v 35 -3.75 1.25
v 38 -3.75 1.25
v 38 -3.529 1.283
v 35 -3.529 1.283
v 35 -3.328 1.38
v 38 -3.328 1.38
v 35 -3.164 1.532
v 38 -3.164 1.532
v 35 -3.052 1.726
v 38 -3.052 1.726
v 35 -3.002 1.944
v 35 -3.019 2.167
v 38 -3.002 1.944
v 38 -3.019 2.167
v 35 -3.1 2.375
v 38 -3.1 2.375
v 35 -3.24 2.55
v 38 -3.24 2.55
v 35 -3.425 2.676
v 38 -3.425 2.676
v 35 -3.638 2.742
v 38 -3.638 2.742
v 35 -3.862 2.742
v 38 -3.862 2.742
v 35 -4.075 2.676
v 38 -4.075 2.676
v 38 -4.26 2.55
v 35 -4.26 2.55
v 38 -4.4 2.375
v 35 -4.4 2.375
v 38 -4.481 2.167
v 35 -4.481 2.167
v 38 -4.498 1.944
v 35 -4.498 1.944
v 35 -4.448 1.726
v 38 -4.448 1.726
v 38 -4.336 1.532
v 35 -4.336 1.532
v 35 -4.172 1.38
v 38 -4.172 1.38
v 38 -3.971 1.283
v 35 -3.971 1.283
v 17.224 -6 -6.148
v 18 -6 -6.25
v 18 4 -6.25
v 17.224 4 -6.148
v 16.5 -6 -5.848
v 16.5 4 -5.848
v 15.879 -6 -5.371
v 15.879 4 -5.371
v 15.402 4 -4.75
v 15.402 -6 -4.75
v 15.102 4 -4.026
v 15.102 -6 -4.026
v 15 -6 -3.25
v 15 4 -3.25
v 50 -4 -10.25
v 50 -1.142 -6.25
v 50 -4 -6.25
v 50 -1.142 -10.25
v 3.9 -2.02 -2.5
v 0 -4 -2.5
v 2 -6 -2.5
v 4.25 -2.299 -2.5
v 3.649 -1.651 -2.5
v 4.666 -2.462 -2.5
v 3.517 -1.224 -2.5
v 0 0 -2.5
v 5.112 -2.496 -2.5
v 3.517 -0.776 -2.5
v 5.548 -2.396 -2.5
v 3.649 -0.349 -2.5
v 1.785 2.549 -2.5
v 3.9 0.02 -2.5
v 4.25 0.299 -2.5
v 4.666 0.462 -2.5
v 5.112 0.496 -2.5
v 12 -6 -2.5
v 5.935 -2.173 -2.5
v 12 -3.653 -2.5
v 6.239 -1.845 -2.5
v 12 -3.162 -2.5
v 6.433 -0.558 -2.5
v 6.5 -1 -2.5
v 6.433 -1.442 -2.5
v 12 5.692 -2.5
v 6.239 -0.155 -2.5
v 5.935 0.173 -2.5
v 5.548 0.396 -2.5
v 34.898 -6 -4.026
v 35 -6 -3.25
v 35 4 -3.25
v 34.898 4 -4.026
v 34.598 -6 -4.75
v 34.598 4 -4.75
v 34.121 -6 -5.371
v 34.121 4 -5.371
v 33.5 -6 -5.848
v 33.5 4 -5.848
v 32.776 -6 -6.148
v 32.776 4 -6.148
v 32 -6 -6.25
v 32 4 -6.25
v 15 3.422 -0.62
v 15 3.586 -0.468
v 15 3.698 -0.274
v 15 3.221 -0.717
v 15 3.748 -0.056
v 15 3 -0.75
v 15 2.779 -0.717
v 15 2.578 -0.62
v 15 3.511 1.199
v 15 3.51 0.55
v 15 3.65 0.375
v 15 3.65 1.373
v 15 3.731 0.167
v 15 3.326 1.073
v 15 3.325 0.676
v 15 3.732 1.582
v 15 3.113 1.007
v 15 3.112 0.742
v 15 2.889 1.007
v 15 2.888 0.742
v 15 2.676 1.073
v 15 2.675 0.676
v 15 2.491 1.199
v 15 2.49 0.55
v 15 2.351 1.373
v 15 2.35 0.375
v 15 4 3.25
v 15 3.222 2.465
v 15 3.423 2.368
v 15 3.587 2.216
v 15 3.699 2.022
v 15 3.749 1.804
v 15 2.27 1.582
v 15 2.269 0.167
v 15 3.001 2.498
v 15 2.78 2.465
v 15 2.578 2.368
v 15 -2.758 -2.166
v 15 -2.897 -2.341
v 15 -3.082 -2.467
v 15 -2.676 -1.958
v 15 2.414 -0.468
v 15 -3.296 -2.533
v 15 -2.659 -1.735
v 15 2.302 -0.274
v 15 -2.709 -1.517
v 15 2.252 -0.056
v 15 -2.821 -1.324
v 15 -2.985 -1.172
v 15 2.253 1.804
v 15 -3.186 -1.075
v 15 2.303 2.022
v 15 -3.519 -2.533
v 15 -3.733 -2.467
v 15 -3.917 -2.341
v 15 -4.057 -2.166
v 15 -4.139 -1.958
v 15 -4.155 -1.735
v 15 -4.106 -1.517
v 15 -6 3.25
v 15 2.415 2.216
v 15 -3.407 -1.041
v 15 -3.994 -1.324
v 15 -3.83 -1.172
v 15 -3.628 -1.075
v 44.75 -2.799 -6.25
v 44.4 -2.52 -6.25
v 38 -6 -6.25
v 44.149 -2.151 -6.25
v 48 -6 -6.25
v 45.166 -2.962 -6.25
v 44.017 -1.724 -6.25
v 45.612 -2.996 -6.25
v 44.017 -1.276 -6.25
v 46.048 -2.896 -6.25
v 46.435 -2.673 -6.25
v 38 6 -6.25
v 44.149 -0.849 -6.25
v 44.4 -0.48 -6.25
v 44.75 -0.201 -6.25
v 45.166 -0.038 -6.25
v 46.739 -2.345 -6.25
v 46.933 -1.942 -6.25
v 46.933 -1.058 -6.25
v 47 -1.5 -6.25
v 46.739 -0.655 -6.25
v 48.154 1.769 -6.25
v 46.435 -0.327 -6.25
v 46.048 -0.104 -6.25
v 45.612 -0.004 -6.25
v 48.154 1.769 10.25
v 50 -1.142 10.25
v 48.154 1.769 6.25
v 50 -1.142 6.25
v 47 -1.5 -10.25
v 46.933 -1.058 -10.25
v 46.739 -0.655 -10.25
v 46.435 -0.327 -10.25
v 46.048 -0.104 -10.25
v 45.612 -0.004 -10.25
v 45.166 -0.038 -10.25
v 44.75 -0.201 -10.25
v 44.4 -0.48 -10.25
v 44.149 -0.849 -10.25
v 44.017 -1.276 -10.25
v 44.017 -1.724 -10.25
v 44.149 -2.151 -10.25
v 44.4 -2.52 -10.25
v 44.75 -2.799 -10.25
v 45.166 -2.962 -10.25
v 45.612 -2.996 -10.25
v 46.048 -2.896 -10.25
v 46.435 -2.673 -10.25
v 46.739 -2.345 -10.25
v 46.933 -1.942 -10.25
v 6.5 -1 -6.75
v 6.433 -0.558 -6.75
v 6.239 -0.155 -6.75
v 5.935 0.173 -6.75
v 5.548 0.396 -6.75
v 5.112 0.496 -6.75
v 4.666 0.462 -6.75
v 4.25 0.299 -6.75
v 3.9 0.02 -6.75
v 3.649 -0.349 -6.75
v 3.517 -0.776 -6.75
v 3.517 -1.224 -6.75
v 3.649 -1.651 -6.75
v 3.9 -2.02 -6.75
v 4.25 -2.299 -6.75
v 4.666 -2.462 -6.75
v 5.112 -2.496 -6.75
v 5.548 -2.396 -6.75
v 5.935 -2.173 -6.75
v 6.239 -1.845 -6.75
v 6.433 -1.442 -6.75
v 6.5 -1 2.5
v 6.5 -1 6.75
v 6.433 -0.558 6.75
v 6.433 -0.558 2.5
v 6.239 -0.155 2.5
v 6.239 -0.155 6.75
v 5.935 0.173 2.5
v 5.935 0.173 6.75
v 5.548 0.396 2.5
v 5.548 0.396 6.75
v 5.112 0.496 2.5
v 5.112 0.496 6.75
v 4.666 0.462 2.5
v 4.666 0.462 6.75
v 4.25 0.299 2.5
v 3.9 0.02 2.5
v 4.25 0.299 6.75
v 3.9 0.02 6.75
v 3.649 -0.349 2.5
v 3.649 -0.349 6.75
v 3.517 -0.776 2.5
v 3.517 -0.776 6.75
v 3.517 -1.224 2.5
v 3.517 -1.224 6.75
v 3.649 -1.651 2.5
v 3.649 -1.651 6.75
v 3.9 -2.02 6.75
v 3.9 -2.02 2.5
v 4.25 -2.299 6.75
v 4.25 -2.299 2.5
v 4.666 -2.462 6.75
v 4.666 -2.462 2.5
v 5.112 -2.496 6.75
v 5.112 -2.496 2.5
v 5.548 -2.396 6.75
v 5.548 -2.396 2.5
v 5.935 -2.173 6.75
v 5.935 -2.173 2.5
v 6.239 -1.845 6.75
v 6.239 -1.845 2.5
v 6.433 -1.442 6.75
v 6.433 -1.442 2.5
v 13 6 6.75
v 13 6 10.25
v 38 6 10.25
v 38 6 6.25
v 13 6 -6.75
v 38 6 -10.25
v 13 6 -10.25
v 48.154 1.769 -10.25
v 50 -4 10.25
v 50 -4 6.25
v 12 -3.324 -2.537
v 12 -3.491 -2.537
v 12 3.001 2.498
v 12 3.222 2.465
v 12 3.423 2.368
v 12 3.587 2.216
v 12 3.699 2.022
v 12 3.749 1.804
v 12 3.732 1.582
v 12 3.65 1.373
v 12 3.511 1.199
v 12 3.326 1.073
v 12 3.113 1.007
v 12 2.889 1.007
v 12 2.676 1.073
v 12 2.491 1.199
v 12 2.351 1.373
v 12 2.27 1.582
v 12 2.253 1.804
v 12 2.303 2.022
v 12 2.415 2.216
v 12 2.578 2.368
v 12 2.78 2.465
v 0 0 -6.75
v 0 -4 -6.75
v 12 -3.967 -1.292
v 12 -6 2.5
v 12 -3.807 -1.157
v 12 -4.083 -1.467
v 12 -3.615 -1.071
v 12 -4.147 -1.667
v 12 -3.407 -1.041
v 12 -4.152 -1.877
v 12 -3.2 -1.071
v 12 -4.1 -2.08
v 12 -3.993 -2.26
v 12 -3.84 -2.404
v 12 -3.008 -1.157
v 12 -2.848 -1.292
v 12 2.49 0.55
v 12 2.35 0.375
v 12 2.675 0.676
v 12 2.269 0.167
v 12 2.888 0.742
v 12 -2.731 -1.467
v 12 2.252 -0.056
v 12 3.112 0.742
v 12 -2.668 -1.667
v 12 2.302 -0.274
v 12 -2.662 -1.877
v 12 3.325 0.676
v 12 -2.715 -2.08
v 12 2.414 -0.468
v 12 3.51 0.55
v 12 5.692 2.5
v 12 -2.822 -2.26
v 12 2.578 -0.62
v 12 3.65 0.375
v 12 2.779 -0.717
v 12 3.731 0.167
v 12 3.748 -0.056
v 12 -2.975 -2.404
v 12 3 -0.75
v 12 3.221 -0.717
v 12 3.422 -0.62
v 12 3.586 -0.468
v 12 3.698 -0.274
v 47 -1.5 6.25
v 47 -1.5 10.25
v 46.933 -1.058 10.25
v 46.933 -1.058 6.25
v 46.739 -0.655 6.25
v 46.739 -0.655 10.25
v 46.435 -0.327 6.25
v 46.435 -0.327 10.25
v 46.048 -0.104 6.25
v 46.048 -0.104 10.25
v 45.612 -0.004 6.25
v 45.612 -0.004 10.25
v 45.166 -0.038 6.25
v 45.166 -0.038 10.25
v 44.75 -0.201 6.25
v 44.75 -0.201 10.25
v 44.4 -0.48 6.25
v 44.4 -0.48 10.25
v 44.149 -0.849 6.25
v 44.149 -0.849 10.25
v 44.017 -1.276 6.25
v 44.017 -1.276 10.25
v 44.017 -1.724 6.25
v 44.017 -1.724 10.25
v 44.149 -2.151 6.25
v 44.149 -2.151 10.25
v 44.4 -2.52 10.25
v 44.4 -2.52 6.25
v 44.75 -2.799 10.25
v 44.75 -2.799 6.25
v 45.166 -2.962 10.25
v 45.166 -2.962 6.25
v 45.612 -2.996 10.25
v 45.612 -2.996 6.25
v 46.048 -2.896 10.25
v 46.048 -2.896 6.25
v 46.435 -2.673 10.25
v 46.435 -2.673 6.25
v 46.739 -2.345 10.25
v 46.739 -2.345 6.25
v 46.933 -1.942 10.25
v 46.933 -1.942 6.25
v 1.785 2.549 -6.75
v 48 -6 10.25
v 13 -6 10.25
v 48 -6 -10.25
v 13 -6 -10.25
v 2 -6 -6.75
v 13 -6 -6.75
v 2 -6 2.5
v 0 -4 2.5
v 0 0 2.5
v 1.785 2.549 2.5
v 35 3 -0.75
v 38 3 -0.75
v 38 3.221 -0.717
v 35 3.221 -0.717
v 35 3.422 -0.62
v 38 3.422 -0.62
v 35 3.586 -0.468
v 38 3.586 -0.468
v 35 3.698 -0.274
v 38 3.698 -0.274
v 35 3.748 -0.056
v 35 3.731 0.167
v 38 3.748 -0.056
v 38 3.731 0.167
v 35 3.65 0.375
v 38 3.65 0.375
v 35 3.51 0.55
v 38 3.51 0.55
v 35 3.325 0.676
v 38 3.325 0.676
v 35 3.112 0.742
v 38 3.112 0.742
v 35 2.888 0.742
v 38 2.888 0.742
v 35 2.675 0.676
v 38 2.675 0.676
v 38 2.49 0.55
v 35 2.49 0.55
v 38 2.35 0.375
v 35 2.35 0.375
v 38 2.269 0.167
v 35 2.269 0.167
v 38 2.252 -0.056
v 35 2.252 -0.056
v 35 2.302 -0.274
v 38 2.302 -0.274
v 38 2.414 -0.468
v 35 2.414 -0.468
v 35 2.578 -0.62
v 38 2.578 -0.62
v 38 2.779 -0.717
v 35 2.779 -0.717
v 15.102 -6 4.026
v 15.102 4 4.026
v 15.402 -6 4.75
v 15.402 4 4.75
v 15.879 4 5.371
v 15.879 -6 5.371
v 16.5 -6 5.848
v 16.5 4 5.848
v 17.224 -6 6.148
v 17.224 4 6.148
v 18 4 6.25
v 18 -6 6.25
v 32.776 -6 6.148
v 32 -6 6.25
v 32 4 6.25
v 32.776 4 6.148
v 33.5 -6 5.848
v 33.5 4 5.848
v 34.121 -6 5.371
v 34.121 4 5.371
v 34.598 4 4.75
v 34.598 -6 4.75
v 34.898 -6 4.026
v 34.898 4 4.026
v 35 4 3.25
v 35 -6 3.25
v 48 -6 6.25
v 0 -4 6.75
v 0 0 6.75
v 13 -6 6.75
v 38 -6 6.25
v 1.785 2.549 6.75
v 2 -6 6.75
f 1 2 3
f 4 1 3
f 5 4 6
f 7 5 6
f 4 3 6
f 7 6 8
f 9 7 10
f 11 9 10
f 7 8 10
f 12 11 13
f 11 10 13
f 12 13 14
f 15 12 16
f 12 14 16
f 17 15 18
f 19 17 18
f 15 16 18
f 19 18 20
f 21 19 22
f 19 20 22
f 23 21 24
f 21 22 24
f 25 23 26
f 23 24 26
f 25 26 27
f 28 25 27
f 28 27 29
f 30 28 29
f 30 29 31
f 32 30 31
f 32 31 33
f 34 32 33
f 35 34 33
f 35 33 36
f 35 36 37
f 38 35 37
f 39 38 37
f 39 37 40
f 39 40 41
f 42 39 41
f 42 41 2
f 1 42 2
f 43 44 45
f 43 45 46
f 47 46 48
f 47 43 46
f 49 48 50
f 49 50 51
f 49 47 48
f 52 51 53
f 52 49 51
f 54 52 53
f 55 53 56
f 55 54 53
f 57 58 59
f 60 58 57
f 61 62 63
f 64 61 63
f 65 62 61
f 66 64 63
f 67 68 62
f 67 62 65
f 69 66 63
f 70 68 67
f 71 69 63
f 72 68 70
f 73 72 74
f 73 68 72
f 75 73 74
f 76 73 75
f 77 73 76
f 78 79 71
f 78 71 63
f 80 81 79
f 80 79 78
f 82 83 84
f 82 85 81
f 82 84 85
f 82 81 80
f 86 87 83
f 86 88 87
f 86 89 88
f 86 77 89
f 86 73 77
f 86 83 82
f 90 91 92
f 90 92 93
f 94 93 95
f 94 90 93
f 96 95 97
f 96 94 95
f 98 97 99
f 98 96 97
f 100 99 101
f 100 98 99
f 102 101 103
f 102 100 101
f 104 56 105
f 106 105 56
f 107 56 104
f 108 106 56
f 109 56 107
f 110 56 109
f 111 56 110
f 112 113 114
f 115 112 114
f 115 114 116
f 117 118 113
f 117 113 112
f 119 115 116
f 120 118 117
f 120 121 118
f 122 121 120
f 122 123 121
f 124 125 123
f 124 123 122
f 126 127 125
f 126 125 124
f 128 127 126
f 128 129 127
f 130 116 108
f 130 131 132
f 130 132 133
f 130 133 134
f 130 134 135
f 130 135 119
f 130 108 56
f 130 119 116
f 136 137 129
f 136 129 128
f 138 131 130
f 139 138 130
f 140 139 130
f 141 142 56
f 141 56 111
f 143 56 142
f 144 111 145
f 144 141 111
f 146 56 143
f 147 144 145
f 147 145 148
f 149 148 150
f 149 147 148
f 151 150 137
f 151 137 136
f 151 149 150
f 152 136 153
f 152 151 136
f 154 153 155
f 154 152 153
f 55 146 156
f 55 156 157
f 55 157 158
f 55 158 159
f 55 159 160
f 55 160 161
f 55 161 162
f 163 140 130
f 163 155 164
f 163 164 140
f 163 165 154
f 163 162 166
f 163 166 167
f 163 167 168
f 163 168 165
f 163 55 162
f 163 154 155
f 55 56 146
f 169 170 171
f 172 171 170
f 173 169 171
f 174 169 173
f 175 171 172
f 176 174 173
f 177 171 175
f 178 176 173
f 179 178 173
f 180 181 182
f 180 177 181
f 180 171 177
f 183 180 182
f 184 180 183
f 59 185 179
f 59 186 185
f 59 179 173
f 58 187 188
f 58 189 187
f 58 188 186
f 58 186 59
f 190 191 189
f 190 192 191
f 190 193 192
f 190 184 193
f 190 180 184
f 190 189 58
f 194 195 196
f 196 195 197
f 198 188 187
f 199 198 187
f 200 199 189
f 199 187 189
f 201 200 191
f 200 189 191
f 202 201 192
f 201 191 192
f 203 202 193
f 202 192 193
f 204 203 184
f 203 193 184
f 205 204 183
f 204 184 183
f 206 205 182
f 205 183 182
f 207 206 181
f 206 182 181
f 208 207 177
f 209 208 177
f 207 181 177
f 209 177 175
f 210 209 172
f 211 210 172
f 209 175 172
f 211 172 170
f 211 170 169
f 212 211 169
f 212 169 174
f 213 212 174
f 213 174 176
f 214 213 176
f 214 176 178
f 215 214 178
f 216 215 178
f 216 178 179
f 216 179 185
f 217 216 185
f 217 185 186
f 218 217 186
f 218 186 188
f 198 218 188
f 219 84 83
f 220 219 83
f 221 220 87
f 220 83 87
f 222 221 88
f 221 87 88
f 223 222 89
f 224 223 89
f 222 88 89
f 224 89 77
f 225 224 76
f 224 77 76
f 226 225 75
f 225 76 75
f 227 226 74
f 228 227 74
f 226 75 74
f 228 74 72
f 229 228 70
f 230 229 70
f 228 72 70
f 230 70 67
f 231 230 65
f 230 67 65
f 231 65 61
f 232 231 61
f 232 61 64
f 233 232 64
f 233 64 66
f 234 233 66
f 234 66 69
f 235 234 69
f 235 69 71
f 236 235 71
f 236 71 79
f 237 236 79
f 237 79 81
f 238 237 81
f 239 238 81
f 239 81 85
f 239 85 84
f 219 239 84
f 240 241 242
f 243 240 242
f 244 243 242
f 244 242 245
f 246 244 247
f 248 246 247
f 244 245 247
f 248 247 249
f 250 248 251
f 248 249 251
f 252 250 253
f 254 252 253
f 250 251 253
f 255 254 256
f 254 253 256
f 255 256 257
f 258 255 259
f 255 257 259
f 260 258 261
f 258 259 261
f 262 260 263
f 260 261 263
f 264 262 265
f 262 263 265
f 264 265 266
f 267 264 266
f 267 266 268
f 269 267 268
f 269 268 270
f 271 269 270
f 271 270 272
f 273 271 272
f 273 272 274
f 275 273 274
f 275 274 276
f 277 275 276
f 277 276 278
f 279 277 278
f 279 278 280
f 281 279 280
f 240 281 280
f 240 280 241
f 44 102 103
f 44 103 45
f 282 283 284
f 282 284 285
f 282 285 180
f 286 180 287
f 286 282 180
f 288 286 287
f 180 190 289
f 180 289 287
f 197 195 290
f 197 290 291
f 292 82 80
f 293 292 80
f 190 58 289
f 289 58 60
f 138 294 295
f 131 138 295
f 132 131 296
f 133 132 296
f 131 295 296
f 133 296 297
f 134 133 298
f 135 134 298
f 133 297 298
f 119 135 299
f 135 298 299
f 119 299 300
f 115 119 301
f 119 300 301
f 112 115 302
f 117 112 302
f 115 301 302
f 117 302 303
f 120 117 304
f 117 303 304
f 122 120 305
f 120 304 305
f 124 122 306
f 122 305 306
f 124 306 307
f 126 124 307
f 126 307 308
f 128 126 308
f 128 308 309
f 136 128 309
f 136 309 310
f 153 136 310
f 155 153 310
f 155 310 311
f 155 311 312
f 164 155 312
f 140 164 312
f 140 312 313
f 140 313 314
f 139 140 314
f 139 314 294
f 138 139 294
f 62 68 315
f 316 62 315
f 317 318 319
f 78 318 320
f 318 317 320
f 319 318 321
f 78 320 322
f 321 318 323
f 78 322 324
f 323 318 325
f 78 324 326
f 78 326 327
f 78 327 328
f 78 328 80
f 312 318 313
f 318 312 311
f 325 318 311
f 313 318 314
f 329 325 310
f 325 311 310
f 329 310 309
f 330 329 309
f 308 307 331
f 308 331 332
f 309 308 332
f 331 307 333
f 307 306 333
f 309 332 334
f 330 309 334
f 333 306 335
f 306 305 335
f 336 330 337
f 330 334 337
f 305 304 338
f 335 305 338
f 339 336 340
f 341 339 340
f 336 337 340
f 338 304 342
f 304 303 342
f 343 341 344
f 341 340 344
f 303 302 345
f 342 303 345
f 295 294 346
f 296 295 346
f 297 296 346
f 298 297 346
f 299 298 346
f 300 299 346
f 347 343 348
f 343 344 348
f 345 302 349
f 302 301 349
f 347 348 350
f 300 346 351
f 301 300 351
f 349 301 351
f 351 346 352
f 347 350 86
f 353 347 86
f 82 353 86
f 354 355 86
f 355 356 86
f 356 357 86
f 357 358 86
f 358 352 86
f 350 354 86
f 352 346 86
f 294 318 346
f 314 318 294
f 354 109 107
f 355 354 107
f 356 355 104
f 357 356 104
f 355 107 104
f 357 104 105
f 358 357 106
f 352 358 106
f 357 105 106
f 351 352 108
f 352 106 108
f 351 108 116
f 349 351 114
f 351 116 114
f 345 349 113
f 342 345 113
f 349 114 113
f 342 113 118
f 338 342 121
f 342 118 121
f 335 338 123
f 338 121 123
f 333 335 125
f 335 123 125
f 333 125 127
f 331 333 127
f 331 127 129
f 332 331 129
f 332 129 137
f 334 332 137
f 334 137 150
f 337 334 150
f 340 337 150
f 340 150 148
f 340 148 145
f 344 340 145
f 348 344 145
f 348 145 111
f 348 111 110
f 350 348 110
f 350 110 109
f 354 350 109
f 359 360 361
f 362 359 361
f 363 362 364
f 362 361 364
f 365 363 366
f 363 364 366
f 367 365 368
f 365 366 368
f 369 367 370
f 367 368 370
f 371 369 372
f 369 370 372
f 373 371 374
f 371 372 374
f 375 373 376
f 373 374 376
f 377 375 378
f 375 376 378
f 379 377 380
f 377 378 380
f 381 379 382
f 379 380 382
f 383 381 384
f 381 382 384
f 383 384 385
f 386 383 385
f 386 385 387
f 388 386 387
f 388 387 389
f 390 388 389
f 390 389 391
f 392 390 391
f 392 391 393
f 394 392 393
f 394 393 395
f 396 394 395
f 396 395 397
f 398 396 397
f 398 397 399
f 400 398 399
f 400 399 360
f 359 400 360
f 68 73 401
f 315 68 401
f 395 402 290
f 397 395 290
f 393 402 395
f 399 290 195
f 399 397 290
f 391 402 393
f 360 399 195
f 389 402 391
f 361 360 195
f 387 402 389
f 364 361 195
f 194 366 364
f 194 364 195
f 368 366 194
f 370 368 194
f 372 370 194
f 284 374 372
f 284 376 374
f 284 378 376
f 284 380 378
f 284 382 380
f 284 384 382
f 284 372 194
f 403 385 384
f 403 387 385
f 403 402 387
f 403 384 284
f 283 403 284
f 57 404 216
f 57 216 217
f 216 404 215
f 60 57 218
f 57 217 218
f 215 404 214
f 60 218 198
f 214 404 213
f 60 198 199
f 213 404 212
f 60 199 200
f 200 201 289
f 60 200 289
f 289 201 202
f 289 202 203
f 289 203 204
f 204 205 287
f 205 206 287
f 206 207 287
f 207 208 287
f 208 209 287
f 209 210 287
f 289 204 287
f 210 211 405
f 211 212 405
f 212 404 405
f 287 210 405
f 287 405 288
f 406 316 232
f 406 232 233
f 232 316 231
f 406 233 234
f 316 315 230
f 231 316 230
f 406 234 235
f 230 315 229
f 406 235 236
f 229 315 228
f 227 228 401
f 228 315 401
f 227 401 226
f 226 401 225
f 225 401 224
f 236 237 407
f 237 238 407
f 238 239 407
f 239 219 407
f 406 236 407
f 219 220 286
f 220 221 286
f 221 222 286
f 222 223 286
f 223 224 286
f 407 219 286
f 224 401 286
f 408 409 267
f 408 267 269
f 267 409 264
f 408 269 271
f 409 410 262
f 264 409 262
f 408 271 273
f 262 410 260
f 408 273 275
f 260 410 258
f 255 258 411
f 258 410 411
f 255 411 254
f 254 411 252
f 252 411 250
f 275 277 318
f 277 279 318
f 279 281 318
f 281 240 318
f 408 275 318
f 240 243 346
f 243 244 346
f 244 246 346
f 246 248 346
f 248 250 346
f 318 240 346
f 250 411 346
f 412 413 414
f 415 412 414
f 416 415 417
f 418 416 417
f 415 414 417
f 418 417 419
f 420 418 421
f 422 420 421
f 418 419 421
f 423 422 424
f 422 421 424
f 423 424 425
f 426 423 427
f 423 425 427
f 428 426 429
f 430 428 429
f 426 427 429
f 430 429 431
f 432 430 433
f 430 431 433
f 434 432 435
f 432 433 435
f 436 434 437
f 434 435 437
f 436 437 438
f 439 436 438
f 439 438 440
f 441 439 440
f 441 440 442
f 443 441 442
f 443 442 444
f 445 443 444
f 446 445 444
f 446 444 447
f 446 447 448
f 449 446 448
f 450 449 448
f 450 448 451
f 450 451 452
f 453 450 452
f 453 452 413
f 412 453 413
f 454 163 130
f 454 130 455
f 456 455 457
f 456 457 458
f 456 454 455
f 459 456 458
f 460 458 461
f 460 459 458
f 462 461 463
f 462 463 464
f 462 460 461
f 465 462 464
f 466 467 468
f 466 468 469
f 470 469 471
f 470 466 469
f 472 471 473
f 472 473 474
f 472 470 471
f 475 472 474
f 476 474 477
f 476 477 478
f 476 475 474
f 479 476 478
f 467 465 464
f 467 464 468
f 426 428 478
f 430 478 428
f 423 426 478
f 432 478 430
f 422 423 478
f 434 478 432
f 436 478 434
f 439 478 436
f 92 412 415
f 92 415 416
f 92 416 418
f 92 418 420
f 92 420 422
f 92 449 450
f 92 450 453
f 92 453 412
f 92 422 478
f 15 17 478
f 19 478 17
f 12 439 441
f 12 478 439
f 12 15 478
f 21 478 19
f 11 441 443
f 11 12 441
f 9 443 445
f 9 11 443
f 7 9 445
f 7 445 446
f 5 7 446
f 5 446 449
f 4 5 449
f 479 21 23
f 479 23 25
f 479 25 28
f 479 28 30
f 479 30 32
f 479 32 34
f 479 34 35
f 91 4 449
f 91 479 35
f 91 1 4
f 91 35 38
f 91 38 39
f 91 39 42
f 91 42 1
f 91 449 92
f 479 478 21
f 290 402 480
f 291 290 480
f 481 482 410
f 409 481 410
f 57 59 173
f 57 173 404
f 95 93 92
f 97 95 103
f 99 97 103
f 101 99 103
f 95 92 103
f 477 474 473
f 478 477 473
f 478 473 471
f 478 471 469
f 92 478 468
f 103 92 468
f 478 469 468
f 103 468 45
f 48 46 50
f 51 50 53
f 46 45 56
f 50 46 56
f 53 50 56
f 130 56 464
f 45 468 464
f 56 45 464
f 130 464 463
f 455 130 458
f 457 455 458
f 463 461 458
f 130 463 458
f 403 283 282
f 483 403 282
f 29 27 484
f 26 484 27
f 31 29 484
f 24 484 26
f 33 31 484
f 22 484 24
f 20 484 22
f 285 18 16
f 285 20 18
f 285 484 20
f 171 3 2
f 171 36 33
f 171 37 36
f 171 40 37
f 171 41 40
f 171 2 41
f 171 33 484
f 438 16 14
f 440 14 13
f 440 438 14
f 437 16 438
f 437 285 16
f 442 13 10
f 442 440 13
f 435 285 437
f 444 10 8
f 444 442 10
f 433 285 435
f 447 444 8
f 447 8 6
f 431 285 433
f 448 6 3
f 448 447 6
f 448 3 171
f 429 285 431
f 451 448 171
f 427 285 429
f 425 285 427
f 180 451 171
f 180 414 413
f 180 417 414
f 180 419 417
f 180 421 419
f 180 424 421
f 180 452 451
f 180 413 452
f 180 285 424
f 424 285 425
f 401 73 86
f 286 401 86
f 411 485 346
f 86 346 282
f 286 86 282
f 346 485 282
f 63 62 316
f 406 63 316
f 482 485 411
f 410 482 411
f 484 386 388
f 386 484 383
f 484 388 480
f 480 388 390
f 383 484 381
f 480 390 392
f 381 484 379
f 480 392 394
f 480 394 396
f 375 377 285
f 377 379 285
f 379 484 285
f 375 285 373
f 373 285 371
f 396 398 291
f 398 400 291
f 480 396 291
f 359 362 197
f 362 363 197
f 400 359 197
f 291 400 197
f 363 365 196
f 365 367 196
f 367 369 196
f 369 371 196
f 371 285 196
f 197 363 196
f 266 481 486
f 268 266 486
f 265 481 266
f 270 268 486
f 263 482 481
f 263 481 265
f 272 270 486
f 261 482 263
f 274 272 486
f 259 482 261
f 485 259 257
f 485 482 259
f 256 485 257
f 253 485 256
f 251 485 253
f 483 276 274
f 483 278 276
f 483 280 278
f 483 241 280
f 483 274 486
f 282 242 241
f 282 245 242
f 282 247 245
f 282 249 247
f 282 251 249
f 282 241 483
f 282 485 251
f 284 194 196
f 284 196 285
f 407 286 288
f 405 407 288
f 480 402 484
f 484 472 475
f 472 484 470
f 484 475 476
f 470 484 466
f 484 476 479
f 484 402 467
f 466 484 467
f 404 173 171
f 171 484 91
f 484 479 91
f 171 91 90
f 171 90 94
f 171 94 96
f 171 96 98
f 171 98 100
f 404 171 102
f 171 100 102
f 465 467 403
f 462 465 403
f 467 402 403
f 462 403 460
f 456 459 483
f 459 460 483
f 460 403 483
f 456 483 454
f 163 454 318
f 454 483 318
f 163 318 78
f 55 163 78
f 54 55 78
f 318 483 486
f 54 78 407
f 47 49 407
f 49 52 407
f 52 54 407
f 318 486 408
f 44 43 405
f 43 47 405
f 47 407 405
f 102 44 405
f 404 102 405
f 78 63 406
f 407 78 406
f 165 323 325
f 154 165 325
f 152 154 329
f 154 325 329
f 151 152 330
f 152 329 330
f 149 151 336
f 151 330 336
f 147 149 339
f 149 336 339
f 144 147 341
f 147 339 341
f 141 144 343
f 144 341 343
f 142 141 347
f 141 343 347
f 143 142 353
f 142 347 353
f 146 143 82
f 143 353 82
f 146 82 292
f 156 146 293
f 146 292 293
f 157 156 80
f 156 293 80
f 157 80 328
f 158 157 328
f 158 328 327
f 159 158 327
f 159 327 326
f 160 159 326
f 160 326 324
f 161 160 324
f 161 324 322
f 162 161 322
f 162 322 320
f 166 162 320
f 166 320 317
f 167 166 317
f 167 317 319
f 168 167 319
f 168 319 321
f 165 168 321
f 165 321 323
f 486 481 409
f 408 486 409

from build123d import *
from OCP.BRepFilletAPI import BRepFilletAPI_MakeChamfer

# Parameters (mm, degrees)
SKETCH_2_W            = 20.5
SKETCH_2_H            = 12
EXTRUDE_1_DEPTH       = 50
SKETCH_3_W            = 24
SKETCH_3_H            = 5
CUT_EXTRUDE_1_DEPTH   = 53.431502935
SKETCH_5_W            = 13.122567423
SKETCH_5_H            = 12.5
CUT_EXTRUDE_2_DEPTH   = 53.431502935
SKETCH_7_R            = 0.75
CUT_EXTRUDE_3_DEPTH   = 40.812843405
SKETCH_10_W           = 19.106520138
SKETCH_10_H           = 8.700699496
CUT_EXTRUDE_3_2_DEPTH = 53.431502935
SKETCH_11_R           = 1.5
CUT_EXTRUDE_6_DEPTH   = 54.150729064
SKETCH_9_R            = 1.5
CUT_EXTRUDE_5_DEPTH   = 55.371407927
SKETCH_12_R           = 0.75
CUT_EXTRUDE_4_DEPTH   = 12
CUT_EXTRUDE_7_DEPTH   = 55.371407927
CHAMFER_5_SIZE        = 2
CHAMFER_6_SIZE        = 2
CHAMFER_6_SIZE2       = 1.867573994
CHAMFER_6_SIZE2_2     = 2.1420728
SKETCH_14_R           = 0.75
CUT_EXTRUDE_5_2_DEPTH = 6
CUT_EXTRUDE_8_DEPTH   = 10
SKETCH_16_R           = 0.75
CUT_EXTRUDE_9_DEPTH   = 5


with BuildPart() as part:
    # Эскиз2 → Вытянуть1 (new body)
    with BuildSketch(Plane(origin=(0, 0, 0), x_dir=(0, 0, -1), z_dir=(1, 0, 0))):
        Rectangle(SKETCH_2_W, SKETCH_2_H)
    extrude(amount=EXTRUDE_1_DEPTH)

    # Эскиз3 → Вырез-Вытянуть1 (cut, through all)
    with BuildSketch(Plane(origin=(0, 6, 0), x_dir=(1, 0, 0), z_dir=(0, 1, 0))):
        Rectangle(SKETCH_3_W, SKETCH_3_H)
    extrude(amount=-CUT_EXTRUDE_1_DEPTH, mode=Mode.SUBTRACT)

    # Эскиз5 → Вырез-Вытянуть2 (cut, through all)
    with BuildSketch(Plane(origin=(0, 6, 0), x_dir=(1, 0, 0), z_dir=(0, 1, 0))):
        with Locations((44.561283712, 0)):
            Rectangle(SKETCH_5_W, SKETCH_5_H)
    extrude(amount=-CUT_EXTRUDE_2_DEPTH, mode=Mode.SUBTRACT)

    # Эскиз7 → Cut-Extrude 3 (cut, through all)
    with BuildSketch(Plane(origin=(38, 0, 0), x_dir=(0, 0, -1), z_dir=(1, 0, 0))):
        with Locations((0, 3)):
            Circle(SKETCH_7_R)
    extrude(amount=-CUT_EXTRUDE_3_DEPTH, mode=Mode.SUBTRACT)

    # Эскиз10 → Cut-Extrude 3 2 (cut, through all)
    with BuildSketch(Plane(origin=(0, 6, 0), x_dir=(1, 0, 0), z_dir=(0, 1, 0))):
        with Locations((3.446739931, 11.100349748)):
            Rectangle(SKETCH_10_W, SKETCH_10_H)
        with Locations((3.446739931, -11.100349748)):
            Rectangle(SKETCH_10_W, SKETCH_10_H)
    extrude(amount=-CUT_EXTRUDE_3_2_DEPTH, mode=Mode.SUBTRACT)

    # Эскиз11 → Вытянуть6 (cut, through all)
    with BuildSketch(Plane.XY.offset(6.75)):
        with Locations((5, -1)):
            Circle(SKETCH_11_R)
    extrude(amount=-CUT_EXTRUDE_6_DEPTH, mode=Mode.SUBTRACT)

    # Эскиз9 → Cut-Extrude 5 (cut, through all)
    with BuildSketch(Plane.XY.offset(10.25)):
        with Locations((45.5, -1.5)):
            Circle(SKETCH_9_R)
    extrude(amount=-CUT_EXTRUDE_5_DEPTH, mode=Mode.SUBTRACT)

    # Эскиз12 → Вырез-Вытянуть4 (cut)
    with BuildSketch(Plane.ZY.offset(-12)):
        with Locations((-1.791386219, -3.407348241)):
            Circle(SKETCH_12_R)
    extrude(amount=-CUT_EXTRUDE_4_DEPTH, mode=Mode.SUBTRACT)

    # Эскиз13 → Вытянуть7 (cut, through all)
    with BuildSketch(Plane.XY.offset(10.25)):
        Polygon((13, 6), (0, 6), (0, 2), align=None)
        Polygon((50, 6), (50, 1), (38, 6), align=None)
    extrude(amount=-CUT_EXTRUDE_7_DEPTH, mode=Mode.SUBTRACT)

    # Фаска5
    chamfer_5_edges = [part.edges().sort_by_distance(p)[0] for p in [
        (50, -6, 8.25),
        (0, -6, -4.625),
        (50, -6, -8.25),
        (0, -6, 4.625),
    ]]
    chamfer(chamfer_5_edges, length=CHAMFER_5_SIZE)

    # Фаска6: one chamfer whose edges measure the first distance from different faces: ONE call of the kernel's chamfer builder (chamfer() names one face for all edges)
    chamfer_6_edges_1 = [part.edges().sort_by_distance(p)[0] for p in [
        (0, 2, 4.625),
    ]]
    chamfer_6_side_1 = [part.faces().sort_by_distance(p)[0] for p in [
        (0, -1, 4.625),
    ]]
    chamfer_6_edges_2 = [part.edges().sort_by_distance(p)[0] for p in [
        (0, 2, -4.625),
    ]]
    chamfer_6_side_2 = [part.faces().sort_by_distance(p)[0] for p in [
        (0, -1, -4.625),
    ]]
    chamfer_6_edges_3 = [part.edges().sort_by_distance(p)[0] for p in [
        (50, 1, 8.25),
    ]]
    chamfer_6_side_3 = [part.faces().sort_by_distance(p)[0] for p in [
        (44, 3.5, 8.25),
    ]]
    chamfer_6_edges_4 = [part.edges().sort_by_distance(p)[0] for p in [
        (50, 1, -8.25),
    ]]
    chamfer_6_side_4 = [part.faces().sort_by_distance(p)[0] for p in [
        (44, 3.5, -8.25),
    ]]
    chamfer_6 = BRepFilletAPI_MakeChamfer(part.part.solid().wrapped)
    for e in chamfer_6_edges_1:
        chamfer_6.Add(CHAMFER_6_SIZE, CHAMFER_6_SIZE2, e.wrapped, chamfer_6_side_1[0].wrapped)  # the first distance lies on this face
    for e in chamfer_6_edges_2:
        chamfer_6.Add(CHAMFER_6_SIZE, CHAMFER_6_SIZE2, e.wrapped, chamfer_6_side_2[0].wrapped)  # the first distance lies on this face
    for e in chamfer_6_edges_3:
        chamfer_6.Add(CHAMFER_6_SIZE, CHAMFER_6_SIZE2_2, e.wrapped, chamfer_6_side_3[0].wrapped)  # the first distance lies on this face
    for e in chamfer_6_edges_4:
        chamfer_6.Add(CHAMFER_6_SIZE, CHAMFER_6_SIZE2_2, e.wrapped, chamfer_6_side_4[0].wrapped)  # the first distance lies on this face
    add(Compound.cast(chamfer_6.Shape()), mode=Mode.REPLACE)

    # Эскиз14 → Cut-Extrude 5 2 (cut)
    with BuildSketch(Plane(origin=(38, 0, 0), x_dir=(0, 0, -1), z_dir=(1, 0, 0))):
        with Locations((-2, -3.75)):
            Circle(SKETCH_14_R)
    extrude(amount=-CUT_EXTRUDE_5_2_DEPTH, mode=Mode.SUBTRACT)

    # Эскиз15 → Вытянуть8 (cut)
    with BuildSketch(Plane.XZ.offset(6)):
        with BuildLine():
            Line((18, 6.25), (32, 6.25))
            ThreePointArc((32, 6.25), (34.121320344, 5.371320344), (35, 3.25))
            Line((35, 3.25), (35, -3.25))
            ThreePointArc((35, -3.25), (34.121320344, -5.371320344), (32, -6.25))
            Line((32, -6.25), (18, -6.25))
            ThreePointArc((18, -6.25), (15.878679656, -5.371320344), (15, -3.25))
            Line((15, -3.25), (15, 3.25))
            ThreePointArc((15, 3.25), (15.878679656, 5.371320344), (18, 6.25))
        make_face()
    extrude(amount=-CUT_EXTRUDE_8_DEPTH, mode=Mode.SUBTRACT)

    # Эскиз16 → Вытянуть9 (cut)
    with BuildSketch(Plane.ZY.offset(-12)):
        with Locations((1.748401574, 3.000943563)):
            Circle(SKETCH_16_R)
    extrude(amount=-CUT_EXTRUDE_9_DEPTH, mode=Mode.SUBTRACT)


solid = part.part
